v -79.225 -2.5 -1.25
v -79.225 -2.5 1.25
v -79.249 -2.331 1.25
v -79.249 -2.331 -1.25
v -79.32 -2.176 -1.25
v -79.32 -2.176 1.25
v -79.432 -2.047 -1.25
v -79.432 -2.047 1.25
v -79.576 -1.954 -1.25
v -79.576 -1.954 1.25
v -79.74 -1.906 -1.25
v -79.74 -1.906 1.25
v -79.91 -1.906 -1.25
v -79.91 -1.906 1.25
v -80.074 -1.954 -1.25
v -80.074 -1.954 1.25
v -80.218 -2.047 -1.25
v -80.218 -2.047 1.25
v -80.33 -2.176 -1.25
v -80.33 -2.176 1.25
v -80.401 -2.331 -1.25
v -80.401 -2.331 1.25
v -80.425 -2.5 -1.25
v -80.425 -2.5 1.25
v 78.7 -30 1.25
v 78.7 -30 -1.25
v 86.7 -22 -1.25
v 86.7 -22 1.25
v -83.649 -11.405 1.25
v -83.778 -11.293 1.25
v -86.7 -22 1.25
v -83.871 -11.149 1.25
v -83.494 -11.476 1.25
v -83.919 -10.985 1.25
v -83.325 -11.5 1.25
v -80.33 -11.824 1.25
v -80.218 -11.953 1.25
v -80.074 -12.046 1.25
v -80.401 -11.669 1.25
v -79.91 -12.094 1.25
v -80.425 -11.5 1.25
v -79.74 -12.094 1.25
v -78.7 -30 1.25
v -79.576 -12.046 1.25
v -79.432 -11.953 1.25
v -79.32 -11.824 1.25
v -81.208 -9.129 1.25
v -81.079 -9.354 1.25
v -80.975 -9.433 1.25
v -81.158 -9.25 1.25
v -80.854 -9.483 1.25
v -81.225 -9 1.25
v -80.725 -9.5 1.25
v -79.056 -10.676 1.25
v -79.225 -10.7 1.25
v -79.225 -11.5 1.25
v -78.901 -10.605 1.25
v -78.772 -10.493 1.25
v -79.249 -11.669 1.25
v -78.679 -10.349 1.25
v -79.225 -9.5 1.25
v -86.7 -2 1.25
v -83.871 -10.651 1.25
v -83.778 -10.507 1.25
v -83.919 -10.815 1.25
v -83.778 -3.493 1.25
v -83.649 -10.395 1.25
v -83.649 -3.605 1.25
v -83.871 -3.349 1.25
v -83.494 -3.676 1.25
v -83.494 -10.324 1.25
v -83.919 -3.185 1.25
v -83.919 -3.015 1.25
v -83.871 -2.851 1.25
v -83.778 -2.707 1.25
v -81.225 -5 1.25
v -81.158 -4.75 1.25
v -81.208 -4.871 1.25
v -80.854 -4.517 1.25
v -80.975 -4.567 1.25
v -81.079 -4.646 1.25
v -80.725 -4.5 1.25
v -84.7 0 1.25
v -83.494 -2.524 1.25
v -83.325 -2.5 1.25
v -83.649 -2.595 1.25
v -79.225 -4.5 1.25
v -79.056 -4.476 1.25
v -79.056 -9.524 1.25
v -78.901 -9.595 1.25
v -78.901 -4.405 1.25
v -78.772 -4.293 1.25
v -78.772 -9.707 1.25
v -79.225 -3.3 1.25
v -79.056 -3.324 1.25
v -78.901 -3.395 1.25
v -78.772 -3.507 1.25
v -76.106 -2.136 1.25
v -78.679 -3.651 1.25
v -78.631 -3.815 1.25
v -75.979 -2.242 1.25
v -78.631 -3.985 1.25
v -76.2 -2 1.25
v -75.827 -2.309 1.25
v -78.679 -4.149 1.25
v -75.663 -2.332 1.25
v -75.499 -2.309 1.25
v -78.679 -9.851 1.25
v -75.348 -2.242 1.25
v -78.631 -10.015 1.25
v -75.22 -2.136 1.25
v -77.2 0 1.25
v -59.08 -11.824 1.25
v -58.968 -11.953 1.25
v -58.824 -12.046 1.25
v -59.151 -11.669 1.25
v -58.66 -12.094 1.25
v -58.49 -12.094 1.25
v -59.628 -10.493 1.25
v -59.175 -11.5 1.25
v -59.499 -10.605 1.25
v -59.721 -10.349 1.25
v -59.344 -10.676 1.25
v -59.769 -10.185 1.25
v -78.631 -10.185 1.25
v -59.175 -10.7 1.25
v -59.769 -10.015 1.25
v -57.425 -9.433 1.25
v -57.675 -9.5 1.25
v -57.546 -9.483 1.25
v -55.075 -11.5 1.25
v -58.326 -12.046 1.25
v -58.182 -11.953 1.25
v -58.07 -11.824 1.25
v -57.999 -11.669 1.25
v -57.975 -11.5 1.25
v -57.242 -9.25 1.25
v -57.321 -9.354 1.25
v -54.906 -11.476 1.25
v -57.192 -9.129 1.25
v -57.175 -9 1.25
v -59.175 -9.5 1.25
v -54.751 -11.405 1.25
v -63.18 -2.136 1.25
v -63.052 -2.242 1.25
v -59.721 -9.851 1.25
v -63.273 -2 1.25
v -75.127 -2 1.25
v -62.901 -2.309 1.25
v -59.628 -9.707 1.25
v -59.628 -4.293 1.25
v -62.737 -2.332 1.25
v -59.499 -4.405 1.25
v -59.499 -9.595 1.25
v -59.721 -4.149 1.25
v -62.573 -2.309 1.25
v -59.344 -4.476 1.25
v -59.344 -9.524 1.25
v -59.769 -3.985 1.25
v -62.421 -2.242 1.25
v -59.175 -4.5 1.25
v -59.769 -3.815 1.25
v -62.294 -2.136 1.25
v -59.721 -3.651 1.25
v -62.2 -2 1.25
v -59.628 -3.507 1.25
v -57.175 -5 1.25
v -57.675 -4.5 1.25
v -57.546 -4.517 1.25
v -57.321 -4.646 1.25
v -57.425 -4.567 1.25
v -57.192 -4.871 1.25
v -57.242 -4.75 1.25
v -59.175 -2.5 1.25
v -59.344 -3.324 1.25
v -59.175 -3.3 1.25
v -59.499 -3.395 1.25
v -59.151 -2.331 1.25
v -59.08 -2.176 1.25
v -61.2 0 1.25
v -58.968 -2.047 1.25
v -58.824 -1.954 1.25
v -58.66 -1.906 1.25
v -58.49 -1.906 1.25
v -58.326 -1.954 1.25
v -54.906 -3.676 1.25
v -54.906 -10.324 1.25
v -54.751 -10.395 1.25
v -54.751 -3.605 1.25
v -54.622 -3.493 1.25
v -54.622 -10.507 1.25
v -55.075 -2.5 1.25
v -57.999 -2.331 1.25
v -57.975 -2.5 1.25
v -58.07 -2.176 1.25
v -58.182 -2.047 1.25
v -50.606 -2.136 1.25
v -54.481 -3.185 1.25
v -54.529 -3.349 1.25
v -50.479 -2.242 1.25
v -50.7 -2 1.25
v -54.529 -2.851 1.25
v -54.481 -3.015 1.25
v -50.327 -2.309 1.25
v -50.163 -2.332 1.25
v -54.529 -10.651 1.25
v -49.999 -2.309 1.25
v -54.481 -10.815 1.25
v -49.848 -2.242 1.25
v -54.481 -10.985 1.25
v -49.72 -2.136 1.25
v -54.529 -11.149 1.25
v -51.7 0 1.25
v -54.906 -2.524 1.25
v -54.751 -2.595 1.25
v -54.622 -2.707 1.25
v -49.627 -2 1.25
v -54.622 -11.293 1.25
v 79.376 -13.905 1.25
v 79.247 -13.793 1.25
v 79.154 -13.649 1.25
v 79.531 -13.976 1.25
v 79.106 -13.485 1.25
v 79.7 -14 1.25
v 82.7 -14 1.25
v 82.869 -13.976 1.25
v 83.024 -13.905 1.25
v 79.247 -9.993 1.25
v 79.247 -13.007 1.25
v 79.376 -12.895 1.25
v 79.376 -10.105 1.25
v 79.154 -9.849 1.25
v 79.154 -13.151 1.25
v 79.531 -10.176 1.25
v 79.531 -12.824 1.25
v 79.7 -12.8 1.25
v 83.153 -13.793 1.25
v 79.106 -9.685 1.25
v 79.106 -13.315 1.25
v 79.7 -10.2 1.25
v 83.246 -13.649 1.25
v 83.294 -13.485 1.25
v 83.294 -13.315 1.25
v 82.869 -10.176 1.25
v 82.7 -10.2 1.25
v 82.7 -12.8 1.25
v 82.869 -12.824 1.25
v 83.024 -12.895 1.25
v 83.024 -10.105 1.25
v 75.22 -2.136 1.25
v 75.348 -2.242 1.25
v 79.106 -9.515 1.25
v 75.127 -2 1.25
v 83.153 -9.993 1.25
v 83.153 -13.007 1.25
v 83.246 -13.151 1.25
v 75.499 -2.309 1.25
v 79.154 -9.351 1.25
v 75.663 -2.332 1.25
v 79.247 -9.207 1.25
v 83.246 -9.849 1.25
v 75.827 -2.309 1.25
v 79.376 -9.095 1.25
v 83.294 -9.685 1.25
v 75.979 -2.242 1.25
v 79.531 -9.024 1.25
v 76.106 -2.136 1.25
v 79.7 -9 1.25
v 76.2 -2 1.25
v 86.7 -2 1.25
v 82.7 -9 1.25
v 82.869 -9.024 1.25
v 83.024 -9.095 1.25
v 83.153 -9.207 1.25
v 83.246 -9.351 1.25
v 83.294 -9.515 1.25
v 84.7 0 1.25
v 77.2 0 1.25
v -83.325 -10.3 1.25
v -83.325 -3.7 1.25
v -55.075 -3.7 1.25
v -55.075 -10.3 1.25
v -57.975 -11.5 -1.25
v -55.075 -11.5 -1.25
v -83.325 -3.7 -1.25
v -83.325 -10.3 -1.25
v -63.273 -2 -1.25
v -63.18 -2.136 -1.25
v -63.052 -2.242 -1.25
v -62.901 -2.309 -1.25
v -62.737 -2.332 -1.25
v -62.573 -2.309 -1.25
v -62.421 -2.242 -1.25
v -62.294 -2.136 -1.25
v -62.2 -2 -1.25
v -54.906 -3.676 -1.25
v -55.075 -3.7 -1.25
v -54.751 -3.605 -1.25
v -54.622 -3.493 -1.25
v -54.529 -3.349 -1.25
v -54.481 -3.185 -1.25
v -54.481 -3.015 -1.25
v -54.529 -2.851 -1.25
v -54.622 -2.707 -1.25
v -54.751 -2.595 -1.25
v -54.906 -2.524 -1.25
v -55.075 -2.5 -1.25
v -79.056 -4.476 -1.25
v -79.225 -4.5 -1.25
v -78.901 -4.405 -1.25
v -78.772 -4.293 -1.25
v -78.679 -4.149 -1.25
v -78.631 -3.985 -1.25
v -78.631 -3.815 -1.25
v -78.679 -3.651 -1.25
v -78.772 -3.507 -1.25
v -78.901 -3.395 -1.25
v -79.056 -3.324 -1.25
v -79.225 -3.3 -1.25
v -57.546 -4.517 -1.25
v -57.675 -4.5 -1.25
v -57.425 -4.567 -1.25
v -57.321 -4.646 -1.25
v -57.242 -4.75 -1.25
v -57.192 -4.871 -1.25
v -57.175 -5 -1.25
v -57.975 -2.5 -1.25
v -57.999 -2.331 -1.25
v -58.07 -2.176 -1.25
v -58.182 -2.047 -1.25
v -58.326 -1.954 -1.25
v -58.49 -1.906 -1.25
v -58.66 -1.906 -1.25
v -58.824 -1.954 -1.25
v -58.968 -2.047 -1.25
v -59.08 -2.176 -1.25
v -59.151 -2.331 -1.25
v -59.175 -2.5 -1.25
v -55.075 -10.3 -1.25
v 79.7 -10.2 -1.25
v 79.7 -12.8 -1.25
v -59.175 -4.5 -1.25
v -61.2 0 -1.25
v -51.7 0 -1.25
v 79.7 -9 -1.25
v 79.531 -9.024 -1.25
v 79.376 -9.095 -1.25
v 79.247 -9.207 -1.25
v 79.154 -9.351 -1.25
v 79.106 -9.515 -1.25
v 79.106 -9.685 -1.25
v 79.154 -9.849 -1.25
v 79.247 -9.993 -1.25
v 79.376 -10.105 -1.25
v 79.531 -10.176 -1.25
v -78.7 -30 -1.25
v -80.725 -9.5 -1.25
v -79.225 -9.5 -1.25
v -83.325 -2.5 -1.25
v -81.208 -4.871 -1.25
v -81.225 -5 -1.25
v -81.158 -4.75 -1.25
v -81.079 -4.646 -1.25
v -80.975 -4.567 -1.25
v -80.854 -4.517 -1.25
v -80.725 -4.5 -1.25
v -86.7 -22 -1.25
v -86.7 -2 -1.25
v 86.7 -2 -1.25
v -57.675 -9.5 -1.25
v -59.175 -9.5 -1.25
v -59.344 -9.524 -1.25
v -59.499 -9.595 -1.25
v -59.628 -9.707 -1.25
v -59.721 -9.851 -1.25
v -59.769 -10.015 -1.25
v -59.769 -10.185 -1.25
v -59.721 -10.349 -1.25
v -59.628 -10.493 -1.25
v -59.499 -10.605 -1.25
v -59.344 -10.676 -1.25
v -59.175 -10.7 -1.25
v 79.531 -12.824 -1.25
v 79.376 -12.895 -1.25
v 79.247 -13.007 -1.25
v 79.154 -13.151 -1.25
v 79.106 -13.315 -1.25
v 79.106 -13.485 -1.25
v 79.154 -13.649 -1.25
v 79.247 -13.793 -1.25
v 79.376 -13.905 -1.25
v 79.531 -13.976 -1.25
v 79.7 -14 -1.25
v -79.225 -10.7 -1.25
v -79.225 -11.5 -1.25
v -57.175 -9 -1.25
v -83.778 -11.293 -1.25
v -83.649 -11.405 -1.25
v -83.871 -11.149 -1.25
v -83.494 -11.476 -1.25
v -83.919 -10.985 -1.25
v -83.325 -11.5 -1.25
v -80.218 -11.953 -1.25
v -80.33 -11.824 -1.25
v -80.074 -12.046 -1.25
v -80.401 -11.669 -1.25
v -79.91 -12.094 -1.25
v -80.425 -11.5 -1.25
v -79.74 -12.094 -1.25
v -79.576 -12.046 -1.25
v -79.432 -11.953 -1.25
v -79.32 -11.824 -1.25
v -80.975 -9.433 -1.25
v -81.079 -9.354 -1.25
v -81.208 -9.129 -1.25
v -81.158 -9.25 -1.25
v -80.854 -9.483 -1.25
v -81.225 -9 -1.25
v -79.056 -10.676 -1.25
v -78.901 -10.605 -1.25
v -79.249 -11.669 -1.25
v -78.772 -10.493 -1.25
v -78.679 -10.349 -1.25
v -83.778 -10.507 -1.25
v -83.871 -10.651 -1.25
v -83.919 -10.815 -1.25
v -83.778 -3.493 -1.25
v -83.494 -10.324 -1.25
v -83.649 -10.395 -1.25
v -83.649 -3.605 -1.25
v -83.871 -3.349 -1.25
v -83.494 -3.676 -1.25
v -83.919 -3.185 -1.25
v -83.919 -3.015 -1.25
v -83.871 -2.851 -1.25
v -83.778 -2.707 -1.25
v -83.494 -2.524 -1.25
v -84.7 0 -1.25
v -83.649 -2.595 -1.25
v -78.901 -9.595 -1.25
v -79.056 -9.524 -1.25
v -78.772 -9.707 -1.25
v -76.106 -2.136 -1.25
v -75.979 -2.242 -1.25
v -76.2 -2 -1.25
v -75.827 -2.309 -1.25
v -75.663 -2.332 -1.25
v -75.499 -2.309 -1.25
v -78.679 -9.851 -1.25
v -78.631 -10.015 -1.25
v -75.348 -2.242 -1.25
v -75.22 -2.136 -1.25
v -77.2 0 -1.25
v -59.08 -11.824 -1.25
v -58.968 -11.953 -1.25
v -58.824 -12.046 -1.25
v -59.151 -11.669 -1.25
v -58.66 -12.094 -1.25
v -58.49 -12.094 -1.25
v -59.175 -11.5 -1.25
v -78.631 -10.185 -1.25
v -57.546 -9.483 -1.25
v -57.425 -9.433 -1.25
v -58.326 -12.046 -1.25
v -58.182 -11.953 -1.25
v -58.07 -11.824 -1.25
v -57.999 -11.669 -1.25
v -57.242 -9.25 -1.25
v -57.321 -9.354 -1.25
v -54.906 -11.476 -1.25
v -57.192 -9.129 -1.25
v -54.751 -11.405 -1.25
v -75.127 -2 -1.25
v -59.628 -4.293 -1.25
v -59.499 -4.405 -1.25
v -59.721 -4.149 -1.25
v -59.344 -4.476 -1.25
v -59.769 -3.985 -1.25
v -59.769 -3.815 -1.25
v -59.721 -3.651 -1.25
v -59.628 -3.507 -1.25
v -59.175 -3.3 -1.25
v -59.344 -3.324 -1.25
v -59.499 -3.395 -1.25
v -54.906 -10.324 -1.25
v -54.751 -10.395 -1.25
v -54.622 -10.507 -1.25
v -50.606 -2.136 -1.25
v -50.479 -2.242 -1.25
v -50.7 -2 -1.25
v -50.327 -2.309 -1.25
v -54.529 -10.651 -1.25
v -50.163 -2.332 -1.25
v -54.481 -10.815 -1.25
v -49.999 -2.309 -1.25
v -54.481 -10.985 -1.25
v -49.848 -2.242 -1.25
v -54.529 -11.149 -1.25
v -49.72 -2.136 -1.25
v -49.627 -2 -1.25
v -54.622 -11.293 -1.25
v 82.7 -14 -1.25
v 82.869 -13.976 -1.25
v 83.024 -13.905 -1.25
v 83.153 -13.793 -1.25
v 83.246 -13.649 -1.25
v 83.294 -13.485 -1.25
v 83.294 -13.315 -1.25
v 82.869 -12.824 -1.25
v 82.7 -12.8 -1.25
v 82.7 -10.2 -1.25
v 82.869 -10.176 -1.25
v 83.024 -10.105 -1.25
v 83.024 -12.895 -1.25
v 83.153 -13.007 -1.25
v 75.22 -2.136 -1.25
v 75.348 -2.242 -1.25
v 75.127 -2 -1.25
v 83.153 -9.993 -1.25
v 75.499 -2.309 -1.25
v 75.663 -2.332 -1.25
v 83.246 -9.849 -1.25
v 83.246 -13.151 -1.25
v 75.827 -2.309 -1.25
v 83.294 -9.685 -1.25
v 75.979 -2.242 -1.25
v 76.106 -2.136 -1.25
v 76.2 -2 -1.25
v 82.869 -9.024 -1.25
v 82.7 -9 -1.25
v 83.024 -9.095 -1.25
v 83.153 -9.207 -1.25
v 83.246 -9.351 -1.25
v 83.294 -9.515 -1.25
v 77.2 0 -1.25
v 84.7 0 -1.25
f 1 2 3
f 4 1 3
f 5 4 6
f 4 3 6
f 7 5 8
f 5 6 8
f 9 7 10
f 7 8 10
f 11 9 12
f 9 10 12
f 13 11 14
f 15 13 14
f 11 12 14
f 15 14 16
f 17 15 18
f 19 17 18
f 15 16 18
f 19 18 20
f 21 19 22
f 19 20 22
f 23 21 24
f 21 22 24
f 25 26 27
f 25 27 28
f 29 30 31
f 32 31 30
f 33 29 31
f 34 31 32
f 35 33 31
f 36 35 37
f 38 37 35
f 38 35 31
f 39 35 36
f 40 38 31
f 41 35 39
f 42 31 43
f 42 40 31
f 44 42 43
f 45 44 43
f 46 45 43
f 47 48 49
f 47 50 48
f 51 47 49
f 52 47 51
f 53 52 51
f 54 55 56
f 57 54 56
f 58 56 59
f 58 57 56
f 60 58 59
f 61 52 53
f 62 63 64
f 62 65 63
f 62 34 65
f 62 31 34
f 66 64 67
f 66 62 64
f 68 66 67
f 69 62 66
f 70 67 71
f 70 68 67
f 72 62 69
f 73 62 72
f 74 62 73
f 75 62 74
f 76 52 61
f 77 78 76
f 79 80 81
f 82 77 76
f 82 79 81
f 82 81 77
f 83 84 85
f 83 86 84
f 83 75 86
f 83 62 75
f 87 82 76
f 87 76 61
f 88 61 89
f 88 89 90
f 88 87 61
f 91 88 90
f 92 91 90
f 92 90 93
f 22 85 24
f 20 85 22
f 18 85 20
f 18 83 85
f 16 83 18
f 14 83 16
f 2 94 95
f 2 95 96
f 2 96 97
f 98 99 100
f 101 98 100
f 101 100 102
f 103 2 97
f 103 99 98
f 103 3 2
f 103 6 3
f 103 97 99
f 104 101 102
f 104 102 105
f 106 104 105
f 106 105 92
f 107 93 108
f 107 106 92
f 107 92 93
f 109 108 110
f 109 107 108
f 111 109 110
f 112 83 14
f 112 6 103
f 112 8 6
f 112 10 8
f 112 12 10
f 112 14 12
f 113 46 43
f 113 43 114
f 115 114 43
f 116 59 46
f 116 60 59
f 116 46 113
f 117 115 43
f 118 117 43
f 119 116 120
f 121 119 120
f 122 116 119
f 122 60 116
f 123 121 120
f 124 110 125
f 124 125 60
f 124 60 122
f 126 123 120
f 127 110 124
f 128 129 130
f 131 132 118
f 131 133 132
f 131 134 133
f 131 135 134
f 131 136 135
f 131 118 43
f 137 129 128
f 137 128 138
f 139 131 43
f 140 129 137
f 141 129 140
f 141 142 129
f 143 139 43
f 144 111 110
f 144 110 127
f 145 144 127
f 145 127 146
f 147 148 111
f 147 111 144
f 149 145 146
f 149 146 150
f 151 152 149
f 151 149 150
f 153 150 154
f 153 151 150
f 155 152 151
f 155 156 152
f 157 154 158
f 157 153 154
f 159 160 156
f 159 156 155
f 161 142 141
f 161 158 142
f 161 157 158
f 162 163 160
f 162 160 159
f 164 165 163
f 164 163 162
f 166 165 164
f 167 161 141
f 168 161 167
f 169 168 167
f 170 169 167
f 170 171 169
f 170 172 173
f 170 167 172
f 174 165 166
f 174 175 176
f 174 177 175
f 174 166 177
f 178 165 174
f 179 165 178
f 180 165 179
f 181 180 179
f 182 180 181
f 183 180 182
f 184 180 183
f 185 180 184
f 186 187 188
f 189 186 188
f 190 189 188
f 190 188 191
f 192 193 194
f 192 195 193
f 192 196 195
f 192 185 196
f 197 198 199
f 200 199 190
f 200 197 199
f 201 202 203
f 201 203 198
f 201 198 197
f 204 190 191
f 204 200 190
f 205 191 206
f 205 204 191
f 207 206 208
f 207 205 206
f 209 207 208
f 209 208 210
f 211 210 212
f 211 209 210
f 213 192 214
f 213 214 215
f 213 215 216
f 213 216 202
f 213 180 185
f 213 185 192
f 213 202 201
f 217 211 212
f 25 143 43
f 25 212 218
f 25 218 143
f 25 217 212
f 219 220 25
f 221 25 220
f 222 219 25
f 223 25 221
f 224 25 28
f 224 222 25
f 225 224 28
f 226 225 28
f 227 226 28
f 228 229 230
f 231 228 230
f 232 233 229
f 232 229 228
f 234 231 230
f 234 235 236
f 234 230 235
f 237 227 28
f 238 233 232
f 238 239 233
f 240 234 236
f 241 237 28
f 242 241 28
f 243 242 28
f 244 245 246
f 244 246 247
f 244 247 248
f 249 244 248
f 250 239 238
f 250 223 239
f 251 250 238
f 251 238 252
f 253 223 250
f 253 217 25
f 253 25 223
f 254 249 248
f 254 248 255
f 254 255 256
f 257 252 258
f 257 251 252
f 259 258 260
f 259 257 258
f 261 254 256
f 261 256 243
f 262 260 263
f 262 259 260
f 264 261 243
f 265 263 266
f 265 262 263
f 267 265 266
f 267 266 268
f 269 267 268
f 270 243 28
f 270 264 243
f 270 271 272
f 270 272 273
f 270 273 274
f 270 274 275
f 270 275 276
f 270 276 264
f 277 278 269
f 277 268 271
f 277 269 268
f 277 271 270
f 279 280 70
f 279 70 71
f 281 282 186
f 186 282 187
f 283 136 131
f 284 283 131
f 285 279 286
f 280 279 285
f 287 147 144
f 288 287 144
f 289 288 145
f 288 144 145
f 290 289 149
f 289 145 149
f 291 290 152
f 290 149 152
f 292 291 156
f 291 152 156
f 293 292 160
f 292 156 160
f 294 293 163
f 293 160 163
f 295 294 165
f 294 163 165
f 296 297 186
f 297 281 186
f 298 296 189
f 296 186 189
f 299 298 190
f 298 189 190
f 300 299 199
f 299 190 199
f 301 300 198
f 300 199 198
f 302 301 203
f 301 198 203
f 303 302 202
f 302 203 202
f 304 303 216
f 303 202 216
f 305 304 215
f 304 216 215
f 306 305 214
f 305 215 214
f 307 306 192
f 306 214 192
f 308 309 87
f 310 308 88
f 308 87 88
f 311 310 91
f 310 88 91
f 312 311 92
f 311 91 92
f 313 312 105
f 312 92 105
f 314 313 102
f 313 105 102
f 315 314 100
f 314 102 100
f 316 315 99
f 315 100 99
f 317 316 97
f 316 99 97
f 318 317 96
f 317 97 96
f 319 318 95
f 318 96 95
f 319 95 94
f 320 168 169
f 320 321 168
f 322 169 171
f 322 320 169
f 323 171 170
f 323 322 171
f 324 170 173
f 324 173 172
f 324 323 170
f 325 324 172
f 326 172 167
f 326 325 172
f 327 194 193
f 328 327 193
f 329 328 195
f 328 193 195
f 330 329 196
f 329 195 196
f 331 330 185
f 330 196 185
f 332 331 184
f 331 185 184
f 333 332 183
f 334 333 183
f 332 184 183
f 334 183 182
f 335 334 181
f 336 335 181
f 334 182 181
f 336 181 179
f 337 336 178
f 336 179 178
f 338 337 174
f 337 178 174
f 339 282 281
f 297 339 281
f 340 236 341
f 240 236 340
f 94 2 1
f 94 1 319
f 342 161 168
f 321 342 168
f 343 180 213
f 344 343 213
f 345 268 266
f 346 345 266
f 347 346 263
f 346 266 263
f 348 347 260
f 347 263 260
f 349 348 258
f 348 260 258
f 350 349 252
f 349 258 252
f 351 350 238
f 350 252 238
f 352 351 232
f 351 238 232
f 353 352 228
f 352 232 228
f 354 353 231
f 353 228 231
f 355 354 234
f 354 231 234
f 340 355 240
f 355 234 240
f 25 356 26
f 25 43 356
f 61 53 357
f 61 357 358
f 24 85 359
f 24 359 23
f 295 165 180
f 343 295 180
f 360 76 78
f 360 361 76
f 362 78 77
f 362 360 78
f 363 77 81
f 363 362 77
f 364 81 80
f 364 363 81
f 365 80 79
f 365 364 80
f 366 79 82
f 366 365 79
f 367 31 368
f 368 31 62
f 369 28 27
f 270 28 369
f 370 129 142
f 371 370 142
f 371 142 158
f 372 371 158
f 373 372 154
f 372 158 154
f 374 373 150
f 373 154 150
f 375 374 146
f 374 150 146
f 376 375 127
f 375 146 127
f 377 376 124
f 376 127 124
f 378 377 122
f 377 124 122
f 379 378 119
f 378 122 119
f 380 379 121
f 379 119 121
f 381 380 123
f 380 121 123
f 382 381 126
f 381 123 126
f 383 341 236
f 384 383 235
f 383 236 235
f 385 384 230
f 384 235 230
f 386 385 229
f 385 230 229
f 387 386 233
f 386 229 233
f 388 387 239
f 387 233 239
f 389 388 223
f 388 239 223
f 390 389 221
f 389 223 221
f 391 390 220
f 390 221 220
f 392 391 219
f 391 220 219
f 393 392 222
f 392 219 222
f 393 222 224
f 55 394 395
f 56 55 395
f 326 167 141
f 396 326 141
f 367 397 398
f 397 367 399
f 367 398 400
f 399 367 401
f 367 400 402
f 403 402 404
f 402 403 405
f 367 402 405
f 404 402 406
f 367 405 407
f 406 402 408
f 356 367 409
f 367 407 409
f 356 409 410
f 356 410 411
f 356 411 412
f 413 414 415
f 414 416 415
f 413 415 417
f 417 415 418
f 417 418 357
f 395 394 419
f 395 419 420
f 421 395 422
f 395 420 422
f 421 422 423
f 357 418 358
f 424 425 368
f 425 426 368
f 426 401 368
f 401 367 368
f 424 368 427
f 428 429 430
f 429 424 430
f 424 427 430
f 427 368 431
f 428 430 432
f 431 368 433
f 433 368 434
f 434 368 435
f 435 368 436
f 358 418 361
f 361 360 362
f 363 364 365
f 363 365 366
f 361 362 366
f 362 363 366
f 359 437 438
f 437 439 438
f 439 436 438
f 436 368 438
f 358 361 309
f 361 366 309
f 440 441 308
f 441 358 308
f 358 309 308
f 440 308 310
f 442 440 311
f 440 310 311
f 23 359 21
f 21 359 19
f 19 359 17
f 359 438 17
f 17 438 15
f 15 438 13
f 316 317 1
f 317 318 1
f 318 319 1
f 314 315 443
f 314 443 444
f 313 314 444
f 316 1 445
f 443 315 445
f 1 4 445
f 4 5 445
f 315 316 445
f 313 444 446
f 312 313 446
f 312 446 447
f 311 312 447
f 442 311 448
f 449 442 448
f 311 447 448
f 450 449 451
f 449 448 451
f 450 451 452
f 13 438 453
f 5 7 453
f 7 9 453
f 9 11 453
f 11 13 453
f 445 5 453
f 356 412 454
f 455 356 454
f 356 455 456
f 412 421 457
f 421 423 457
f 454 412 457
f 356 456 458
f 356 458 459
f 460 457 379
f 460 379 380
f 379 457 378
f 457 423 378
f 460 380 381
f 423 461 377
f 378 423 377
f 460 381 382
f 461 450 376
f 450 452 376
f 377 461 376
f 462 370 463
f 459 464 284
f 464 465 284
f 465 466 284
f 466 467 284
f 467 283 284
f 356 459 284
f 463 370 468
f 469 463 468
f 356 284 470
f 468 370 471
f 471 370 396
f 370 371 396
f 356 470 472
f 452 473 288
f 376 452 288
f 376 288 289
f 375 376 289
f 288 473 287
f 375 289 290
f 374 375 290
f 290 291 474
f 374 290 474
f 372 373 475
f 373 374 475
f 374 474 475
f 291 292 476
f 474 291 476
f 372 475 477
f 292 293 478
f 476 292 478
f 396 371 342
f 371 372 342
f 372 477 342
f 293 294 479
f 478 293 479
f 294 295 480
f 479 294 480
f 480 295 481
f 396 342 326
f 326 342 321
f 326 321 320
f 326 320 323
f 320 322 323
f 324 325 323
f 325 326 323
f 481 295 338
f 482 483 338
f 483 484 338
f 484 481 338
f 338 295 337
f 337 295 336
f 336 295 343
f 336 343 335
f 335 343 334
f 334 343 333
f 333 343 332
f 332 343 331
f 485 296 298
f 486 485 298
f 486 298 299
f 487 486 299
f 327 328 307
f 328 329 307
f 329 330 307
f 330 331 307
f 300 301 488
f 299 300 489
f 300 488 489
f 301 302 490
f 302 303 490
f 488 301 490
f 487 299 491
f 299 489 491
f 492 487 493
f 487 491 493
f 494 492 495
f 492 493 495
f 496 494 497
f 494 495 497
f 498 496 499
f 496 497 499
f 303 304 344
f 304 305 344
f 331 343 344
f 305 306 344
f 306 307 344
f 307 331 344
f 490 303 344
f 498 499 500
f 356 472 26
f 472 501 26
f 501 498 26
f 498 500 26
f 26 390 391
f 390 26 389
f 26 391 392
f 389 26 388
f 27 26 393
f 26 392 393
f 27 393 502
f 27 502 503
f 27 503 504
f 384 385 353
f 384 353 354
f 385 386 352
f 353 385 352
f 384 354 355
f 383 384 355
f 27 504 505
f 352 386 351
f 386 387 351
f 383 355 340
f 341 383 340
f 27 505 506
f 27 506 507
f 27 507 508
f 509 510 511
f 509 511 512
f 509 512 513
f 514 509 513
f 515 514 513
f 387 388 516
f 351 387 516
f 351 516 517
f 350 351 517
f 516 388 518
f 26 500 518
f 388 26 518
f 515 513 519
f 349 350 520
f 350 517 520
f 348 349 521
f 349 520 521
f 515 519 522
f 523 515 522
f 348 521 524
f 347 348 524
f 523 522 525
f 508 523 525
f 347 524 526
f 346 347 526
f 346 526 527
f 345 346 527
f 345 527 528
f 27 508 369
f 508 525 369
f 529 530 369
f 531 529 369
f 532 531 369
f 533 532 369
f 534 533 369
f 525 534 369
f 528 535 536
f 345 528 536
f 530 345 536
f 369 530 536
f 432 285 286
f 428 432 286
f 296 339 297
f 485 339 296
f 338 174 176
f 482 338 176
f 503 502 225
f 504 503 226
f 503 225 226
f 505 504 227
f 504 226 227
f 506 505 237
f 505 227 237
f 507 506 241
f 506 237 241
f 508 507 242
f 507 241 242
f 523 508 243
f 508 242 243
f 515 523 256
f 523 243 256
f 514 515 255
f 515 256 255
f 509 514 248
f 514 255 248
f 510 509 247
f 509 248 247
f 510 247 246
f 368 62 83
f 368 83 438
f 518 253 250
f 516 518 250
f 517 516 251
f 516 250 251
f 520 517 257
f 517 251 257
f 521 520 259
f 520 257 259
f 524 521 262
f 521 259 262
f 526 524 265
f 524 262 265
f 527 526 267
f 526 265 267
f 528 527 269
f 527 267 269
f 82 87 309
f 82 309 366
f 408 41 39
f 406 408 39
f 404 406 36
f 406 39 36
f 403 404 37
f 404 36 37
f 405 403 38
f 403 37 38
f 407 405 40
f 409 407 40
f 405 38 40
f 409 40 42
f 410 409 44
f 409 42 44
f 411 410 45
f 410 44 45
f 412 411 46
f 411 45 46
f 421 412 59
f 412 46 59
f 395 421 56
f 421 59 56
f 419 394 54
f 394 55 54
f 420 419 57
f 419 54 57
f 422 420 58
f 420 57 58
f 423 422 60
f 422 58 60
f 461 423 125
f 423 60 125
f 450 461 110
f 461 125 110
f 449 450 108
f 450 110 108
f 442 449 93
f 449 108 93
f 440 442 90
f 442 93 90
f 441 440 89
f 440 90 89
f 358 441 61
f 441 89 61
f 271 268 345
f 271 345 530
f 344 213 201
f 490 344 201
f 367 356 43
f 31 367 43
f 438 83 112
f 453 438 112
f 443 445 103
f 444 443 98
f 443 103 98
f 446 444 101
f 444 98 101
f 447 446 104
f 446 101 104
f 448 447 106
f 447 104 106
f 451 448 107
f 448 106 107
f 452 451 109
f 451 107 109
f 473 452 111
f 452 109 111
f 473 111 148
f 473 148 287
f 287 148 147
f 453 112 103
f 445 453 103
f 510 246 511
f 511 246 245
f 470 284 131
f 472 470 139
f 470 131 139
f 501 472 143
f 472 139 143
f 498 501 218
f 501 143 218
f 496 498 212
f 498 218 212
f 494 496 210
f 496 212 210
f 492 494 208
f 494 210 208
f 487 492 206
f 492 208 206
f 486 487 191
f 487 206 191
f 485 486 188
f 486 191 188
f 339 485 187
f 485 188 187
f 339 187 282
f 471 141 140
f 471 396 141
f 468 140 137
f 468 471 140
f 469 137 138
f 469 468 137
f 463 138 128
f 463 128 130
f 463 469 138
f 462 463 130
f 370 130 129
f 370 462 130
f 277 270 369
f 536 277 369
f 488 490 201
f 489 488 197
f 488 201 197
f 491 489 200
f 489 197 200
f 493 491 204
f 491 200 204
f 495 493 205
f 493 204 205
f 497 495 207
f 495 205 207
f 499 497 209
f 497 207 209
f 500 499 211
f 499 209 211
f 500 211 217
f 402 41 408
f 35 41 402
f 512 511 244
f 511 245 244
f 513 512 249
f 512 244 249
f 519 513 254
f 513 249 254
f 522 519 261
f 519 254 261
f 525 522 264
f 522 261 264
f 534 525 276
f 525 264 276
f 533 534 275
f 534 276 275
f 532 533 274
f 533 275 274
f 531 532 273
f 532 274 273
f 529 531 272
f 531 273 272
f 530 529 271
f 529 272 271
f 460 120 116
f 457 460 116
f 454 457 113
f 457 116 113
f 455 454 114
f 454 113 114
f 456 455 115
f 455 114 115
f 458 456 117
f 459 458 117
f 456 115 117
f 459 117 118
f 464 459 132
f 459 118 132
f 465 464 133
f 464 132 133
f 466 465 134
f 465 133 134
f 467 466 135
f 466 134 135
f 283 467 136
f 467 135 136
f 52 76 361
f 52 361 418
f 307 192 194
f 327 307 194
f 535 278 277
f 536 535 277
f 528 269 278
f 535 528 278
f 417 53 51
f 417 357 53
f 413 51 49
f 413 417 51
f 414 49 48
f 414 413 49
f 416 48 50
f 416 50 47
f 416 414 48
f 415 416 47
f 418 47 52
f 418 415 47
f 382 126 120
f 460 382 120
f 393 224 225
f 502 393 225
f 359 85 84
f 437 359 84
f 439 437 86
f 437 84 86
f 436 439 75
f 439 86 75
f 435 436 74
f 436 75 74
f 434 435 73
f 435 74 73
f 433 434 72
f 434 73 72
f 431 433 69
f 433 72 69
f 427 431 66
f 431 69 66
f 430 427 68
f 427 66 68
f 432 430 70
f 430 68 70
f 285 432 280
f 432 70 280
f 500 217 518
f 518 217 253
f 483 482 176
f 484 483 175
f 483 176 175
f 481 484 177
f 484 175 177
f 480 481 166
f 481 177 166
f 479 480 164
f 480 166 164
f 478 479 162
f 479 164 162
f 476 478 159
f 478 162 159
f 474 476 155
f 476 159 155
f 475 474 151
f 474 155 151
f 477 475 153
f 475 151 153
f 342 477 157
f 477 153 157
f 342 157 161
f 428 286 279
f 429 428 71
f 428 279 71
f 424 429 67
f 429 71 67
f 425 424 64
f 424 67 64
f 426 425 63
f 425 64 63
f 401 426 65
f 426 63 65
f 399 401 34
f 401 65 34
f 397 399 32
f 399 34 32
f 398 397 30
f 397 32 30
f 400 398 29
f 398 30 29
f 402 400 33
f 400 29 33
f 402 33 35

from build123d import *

# Parameters (mm, degrees)
SKETCH_1_W          = 173.4
SKETCH_1_H          = 30
EXTRUDE_1_DEPTH     = 1.25
CHAMFER_1_SIZE      = 8
CHAMFER_2_SIZE      = 2
CUT_EXTRUDE_1_DEPTH = 3.5
CUT_EXTRUDE_4_DEPTH = 3.5
CUT_EXTRUDE_2_DEPTH = 3.5
SKETCH_5_R          = 0.6
CUT_EXTRUDE_3_DEPTH = 3.5
FILLET_1_R          = 0.5
SKETCH_7_W          = 3
SKETCH_7_H          = 5
CUT_EXTRUDE_5_DEPTH = 3.5
SKETCH_8_R          = 0.6
CUT_EXTRUDE_6_DEPTH = 3.5


with BuildPart() as part:
    # 草图1 → 凸台-拉伸1 (new body, symmetric)
    with BuildSketch(Plane.XY):
        with Locations((0, -15)):
            Rectangle(SKETCH_1_W, SKETCH_1_H)
    extrude(amount=EXTRUDE_1_DEPTH, both=True)

    # 倒角1
    chamfer_1_edges = [part.edges().sort_by_distance(p)[0] for p in [
        (86.7, -30, 0),
        (-86.7, -30, 0),
    ]]
    chamfer(chamfer_1_edges, length=CHAMFER_1_SIZE)

    # 倒角2
    chamfer_2_edges = [part.edges().sort_by_distance(p)[0] for p in [
        (-86.7, 0, 0),
        (86.7, 0, 0),
    ]]
    chamfer(chamfer_2_edges, length=CHAMFER_2_SIZE)

    # 草图2 → 切除-拉伸1 (cut, through all)
    with BuildSketch(Plane.XY.offset(1.25)):
        Polygon((-77.2, 0), (-76.2, -2), (-62.2, -2), (-61.2, 0), align=None)
    extrude(amount=-CUT_EXTRUDE_1_DEPTH, mode=Mode.SUBTRACT)

    # 草图6 → 切除-拉伸4 (cut, through all)
    with BuildSketch(Plane.XY.offset(1.25)):
        Polygon((-51.7, 0), (-50.7, -2), (76.2, -2), (77.2, 0), align=None)
    extrude(amount=-CUT_EXTRUDE_4_DEPTH, mode=Mode.SUBTRACT)

    # 草图4 → 切除-拉伸2 (cut, through all)
    with BuildSketch(Plane.XY.offset(1.25)):
        Polygon((-83.325, -2.5), (-79.225, -2.5), (-79.225, -4.5), (-81.225, -4.5), (-81.225, -9.5), (-79.225, -9.5), (-79.225, -11.5), (-83.325, -11.5), align=None)
        Polygon((-59.175, -11.5), (-55.075, -11.5), (-55.075, -2.5), (-59.175, -2.5), (-59.175, -4.5), (-57.175, -4.5), (-57.175, -9.5), (-59.175, -9.5), align=None)
    extrude(amount=-CUT_EXTRUDE_2_DEPTH, mode=Mode.SUBTRACT)

    # 草图5 → 切除-拉伸3 (cut, through all)
    with BuildSketch(Plane.XY.offset(1.25)):
        with Locations((-83.325, -3.1)):
            Circle(SKETCH_5_R)
        with Locations((-83.325, -10.9)):
            Circle(SKETCH_5_R)
        with Locations((-79.825, -11.5)):
            Circle(SKETCH_5_R)
        with Locations((-79.225, -10.1)):
            Circle(SKETCH_5_R)
        with Locations((-79.225, -3.9)):
            Circle(SKETCH_5_R)
        with Locations((-79.825, -2.5)):
            Circle(SKETCH_5_R)
        with Locations((-58.575, -2.5)):
            Circle(SKETCH_5_R)
        with Locations((-59.175, -3.9)):
            Circle(SKETCH_5_R)
        with Locations((-59.175, -10.1)):
            Circle(SKETCH_5_R)
        with Locations((-58.575, -11.5)):
            Circle(SKETCH_5_R)
        with Locations((-55.075, -10.9)):
            Circle(SKETCH_5_R)
        with Locations((-55.075, -3.1)):
            Circle(SKETCH_5_R)
        with Locations((-75.663343685, -1.731671843)):
            Circle(SKETCH_5_R)
        with Locations((-62.736656315, -1.731671843)):
            Circle(SKETCH_5_R)
        with Locations((-50.163343685, -1.731671843)):
            Circle(SKETCH_5_R)
        with Locations((75.663343685, -1.731671843)):
            Circle(SKETCH_5_R)
    extrude(amount=-CUT_EXTRUDE_3_DEPTH, mode=Mode.SUBTRACT)

    # 圆角1
    fillet_1_edges = [part.edges().sort_by_distance(p)[0] for p in [
        (-57.175, -9.5, 0),
        (-57.175, -4.5, 0),
        (-81.225, -4.5, 0),
        (-81.225, -9.5, 0),
    ]]
    fillet(fillet_1_edges, radius=FILLET_1_R)

    # 草图7 → 切除-拉伸5 (cut, through all)
    with BuildSketch(Plane.XY.offset(1.25)):
        with Locations((81.2, -11.5)):
            Rectangle(SKETCH_7_W, SKETCH_7_H)
    extrude(amount=-CUT_EXTRUDE_5_DEPTH, mode=Mode.SUBTRACT)

    # 草图8 → 切除-拉伸6 (cut, through all)
    with BuildSketch(Plane.XY.offset(1.25)):
        with Locations((79.7, -9.6)):
            Circle(SKETCH_8_R)
        with Locations((79.7, -13.4)):
            Circle(SKETCH_8_R)
        with Locations((82.7, -13.4)):
            Circle(SKETCH_8_R)
        with Locations((82.7, -9.6)):
            Circle(SKETCH_8_R)
    extrude(amount=-CUT_EXTRUDE_6_DEPTH, mode=Mode.SUBTRACT)


solid = part.part
